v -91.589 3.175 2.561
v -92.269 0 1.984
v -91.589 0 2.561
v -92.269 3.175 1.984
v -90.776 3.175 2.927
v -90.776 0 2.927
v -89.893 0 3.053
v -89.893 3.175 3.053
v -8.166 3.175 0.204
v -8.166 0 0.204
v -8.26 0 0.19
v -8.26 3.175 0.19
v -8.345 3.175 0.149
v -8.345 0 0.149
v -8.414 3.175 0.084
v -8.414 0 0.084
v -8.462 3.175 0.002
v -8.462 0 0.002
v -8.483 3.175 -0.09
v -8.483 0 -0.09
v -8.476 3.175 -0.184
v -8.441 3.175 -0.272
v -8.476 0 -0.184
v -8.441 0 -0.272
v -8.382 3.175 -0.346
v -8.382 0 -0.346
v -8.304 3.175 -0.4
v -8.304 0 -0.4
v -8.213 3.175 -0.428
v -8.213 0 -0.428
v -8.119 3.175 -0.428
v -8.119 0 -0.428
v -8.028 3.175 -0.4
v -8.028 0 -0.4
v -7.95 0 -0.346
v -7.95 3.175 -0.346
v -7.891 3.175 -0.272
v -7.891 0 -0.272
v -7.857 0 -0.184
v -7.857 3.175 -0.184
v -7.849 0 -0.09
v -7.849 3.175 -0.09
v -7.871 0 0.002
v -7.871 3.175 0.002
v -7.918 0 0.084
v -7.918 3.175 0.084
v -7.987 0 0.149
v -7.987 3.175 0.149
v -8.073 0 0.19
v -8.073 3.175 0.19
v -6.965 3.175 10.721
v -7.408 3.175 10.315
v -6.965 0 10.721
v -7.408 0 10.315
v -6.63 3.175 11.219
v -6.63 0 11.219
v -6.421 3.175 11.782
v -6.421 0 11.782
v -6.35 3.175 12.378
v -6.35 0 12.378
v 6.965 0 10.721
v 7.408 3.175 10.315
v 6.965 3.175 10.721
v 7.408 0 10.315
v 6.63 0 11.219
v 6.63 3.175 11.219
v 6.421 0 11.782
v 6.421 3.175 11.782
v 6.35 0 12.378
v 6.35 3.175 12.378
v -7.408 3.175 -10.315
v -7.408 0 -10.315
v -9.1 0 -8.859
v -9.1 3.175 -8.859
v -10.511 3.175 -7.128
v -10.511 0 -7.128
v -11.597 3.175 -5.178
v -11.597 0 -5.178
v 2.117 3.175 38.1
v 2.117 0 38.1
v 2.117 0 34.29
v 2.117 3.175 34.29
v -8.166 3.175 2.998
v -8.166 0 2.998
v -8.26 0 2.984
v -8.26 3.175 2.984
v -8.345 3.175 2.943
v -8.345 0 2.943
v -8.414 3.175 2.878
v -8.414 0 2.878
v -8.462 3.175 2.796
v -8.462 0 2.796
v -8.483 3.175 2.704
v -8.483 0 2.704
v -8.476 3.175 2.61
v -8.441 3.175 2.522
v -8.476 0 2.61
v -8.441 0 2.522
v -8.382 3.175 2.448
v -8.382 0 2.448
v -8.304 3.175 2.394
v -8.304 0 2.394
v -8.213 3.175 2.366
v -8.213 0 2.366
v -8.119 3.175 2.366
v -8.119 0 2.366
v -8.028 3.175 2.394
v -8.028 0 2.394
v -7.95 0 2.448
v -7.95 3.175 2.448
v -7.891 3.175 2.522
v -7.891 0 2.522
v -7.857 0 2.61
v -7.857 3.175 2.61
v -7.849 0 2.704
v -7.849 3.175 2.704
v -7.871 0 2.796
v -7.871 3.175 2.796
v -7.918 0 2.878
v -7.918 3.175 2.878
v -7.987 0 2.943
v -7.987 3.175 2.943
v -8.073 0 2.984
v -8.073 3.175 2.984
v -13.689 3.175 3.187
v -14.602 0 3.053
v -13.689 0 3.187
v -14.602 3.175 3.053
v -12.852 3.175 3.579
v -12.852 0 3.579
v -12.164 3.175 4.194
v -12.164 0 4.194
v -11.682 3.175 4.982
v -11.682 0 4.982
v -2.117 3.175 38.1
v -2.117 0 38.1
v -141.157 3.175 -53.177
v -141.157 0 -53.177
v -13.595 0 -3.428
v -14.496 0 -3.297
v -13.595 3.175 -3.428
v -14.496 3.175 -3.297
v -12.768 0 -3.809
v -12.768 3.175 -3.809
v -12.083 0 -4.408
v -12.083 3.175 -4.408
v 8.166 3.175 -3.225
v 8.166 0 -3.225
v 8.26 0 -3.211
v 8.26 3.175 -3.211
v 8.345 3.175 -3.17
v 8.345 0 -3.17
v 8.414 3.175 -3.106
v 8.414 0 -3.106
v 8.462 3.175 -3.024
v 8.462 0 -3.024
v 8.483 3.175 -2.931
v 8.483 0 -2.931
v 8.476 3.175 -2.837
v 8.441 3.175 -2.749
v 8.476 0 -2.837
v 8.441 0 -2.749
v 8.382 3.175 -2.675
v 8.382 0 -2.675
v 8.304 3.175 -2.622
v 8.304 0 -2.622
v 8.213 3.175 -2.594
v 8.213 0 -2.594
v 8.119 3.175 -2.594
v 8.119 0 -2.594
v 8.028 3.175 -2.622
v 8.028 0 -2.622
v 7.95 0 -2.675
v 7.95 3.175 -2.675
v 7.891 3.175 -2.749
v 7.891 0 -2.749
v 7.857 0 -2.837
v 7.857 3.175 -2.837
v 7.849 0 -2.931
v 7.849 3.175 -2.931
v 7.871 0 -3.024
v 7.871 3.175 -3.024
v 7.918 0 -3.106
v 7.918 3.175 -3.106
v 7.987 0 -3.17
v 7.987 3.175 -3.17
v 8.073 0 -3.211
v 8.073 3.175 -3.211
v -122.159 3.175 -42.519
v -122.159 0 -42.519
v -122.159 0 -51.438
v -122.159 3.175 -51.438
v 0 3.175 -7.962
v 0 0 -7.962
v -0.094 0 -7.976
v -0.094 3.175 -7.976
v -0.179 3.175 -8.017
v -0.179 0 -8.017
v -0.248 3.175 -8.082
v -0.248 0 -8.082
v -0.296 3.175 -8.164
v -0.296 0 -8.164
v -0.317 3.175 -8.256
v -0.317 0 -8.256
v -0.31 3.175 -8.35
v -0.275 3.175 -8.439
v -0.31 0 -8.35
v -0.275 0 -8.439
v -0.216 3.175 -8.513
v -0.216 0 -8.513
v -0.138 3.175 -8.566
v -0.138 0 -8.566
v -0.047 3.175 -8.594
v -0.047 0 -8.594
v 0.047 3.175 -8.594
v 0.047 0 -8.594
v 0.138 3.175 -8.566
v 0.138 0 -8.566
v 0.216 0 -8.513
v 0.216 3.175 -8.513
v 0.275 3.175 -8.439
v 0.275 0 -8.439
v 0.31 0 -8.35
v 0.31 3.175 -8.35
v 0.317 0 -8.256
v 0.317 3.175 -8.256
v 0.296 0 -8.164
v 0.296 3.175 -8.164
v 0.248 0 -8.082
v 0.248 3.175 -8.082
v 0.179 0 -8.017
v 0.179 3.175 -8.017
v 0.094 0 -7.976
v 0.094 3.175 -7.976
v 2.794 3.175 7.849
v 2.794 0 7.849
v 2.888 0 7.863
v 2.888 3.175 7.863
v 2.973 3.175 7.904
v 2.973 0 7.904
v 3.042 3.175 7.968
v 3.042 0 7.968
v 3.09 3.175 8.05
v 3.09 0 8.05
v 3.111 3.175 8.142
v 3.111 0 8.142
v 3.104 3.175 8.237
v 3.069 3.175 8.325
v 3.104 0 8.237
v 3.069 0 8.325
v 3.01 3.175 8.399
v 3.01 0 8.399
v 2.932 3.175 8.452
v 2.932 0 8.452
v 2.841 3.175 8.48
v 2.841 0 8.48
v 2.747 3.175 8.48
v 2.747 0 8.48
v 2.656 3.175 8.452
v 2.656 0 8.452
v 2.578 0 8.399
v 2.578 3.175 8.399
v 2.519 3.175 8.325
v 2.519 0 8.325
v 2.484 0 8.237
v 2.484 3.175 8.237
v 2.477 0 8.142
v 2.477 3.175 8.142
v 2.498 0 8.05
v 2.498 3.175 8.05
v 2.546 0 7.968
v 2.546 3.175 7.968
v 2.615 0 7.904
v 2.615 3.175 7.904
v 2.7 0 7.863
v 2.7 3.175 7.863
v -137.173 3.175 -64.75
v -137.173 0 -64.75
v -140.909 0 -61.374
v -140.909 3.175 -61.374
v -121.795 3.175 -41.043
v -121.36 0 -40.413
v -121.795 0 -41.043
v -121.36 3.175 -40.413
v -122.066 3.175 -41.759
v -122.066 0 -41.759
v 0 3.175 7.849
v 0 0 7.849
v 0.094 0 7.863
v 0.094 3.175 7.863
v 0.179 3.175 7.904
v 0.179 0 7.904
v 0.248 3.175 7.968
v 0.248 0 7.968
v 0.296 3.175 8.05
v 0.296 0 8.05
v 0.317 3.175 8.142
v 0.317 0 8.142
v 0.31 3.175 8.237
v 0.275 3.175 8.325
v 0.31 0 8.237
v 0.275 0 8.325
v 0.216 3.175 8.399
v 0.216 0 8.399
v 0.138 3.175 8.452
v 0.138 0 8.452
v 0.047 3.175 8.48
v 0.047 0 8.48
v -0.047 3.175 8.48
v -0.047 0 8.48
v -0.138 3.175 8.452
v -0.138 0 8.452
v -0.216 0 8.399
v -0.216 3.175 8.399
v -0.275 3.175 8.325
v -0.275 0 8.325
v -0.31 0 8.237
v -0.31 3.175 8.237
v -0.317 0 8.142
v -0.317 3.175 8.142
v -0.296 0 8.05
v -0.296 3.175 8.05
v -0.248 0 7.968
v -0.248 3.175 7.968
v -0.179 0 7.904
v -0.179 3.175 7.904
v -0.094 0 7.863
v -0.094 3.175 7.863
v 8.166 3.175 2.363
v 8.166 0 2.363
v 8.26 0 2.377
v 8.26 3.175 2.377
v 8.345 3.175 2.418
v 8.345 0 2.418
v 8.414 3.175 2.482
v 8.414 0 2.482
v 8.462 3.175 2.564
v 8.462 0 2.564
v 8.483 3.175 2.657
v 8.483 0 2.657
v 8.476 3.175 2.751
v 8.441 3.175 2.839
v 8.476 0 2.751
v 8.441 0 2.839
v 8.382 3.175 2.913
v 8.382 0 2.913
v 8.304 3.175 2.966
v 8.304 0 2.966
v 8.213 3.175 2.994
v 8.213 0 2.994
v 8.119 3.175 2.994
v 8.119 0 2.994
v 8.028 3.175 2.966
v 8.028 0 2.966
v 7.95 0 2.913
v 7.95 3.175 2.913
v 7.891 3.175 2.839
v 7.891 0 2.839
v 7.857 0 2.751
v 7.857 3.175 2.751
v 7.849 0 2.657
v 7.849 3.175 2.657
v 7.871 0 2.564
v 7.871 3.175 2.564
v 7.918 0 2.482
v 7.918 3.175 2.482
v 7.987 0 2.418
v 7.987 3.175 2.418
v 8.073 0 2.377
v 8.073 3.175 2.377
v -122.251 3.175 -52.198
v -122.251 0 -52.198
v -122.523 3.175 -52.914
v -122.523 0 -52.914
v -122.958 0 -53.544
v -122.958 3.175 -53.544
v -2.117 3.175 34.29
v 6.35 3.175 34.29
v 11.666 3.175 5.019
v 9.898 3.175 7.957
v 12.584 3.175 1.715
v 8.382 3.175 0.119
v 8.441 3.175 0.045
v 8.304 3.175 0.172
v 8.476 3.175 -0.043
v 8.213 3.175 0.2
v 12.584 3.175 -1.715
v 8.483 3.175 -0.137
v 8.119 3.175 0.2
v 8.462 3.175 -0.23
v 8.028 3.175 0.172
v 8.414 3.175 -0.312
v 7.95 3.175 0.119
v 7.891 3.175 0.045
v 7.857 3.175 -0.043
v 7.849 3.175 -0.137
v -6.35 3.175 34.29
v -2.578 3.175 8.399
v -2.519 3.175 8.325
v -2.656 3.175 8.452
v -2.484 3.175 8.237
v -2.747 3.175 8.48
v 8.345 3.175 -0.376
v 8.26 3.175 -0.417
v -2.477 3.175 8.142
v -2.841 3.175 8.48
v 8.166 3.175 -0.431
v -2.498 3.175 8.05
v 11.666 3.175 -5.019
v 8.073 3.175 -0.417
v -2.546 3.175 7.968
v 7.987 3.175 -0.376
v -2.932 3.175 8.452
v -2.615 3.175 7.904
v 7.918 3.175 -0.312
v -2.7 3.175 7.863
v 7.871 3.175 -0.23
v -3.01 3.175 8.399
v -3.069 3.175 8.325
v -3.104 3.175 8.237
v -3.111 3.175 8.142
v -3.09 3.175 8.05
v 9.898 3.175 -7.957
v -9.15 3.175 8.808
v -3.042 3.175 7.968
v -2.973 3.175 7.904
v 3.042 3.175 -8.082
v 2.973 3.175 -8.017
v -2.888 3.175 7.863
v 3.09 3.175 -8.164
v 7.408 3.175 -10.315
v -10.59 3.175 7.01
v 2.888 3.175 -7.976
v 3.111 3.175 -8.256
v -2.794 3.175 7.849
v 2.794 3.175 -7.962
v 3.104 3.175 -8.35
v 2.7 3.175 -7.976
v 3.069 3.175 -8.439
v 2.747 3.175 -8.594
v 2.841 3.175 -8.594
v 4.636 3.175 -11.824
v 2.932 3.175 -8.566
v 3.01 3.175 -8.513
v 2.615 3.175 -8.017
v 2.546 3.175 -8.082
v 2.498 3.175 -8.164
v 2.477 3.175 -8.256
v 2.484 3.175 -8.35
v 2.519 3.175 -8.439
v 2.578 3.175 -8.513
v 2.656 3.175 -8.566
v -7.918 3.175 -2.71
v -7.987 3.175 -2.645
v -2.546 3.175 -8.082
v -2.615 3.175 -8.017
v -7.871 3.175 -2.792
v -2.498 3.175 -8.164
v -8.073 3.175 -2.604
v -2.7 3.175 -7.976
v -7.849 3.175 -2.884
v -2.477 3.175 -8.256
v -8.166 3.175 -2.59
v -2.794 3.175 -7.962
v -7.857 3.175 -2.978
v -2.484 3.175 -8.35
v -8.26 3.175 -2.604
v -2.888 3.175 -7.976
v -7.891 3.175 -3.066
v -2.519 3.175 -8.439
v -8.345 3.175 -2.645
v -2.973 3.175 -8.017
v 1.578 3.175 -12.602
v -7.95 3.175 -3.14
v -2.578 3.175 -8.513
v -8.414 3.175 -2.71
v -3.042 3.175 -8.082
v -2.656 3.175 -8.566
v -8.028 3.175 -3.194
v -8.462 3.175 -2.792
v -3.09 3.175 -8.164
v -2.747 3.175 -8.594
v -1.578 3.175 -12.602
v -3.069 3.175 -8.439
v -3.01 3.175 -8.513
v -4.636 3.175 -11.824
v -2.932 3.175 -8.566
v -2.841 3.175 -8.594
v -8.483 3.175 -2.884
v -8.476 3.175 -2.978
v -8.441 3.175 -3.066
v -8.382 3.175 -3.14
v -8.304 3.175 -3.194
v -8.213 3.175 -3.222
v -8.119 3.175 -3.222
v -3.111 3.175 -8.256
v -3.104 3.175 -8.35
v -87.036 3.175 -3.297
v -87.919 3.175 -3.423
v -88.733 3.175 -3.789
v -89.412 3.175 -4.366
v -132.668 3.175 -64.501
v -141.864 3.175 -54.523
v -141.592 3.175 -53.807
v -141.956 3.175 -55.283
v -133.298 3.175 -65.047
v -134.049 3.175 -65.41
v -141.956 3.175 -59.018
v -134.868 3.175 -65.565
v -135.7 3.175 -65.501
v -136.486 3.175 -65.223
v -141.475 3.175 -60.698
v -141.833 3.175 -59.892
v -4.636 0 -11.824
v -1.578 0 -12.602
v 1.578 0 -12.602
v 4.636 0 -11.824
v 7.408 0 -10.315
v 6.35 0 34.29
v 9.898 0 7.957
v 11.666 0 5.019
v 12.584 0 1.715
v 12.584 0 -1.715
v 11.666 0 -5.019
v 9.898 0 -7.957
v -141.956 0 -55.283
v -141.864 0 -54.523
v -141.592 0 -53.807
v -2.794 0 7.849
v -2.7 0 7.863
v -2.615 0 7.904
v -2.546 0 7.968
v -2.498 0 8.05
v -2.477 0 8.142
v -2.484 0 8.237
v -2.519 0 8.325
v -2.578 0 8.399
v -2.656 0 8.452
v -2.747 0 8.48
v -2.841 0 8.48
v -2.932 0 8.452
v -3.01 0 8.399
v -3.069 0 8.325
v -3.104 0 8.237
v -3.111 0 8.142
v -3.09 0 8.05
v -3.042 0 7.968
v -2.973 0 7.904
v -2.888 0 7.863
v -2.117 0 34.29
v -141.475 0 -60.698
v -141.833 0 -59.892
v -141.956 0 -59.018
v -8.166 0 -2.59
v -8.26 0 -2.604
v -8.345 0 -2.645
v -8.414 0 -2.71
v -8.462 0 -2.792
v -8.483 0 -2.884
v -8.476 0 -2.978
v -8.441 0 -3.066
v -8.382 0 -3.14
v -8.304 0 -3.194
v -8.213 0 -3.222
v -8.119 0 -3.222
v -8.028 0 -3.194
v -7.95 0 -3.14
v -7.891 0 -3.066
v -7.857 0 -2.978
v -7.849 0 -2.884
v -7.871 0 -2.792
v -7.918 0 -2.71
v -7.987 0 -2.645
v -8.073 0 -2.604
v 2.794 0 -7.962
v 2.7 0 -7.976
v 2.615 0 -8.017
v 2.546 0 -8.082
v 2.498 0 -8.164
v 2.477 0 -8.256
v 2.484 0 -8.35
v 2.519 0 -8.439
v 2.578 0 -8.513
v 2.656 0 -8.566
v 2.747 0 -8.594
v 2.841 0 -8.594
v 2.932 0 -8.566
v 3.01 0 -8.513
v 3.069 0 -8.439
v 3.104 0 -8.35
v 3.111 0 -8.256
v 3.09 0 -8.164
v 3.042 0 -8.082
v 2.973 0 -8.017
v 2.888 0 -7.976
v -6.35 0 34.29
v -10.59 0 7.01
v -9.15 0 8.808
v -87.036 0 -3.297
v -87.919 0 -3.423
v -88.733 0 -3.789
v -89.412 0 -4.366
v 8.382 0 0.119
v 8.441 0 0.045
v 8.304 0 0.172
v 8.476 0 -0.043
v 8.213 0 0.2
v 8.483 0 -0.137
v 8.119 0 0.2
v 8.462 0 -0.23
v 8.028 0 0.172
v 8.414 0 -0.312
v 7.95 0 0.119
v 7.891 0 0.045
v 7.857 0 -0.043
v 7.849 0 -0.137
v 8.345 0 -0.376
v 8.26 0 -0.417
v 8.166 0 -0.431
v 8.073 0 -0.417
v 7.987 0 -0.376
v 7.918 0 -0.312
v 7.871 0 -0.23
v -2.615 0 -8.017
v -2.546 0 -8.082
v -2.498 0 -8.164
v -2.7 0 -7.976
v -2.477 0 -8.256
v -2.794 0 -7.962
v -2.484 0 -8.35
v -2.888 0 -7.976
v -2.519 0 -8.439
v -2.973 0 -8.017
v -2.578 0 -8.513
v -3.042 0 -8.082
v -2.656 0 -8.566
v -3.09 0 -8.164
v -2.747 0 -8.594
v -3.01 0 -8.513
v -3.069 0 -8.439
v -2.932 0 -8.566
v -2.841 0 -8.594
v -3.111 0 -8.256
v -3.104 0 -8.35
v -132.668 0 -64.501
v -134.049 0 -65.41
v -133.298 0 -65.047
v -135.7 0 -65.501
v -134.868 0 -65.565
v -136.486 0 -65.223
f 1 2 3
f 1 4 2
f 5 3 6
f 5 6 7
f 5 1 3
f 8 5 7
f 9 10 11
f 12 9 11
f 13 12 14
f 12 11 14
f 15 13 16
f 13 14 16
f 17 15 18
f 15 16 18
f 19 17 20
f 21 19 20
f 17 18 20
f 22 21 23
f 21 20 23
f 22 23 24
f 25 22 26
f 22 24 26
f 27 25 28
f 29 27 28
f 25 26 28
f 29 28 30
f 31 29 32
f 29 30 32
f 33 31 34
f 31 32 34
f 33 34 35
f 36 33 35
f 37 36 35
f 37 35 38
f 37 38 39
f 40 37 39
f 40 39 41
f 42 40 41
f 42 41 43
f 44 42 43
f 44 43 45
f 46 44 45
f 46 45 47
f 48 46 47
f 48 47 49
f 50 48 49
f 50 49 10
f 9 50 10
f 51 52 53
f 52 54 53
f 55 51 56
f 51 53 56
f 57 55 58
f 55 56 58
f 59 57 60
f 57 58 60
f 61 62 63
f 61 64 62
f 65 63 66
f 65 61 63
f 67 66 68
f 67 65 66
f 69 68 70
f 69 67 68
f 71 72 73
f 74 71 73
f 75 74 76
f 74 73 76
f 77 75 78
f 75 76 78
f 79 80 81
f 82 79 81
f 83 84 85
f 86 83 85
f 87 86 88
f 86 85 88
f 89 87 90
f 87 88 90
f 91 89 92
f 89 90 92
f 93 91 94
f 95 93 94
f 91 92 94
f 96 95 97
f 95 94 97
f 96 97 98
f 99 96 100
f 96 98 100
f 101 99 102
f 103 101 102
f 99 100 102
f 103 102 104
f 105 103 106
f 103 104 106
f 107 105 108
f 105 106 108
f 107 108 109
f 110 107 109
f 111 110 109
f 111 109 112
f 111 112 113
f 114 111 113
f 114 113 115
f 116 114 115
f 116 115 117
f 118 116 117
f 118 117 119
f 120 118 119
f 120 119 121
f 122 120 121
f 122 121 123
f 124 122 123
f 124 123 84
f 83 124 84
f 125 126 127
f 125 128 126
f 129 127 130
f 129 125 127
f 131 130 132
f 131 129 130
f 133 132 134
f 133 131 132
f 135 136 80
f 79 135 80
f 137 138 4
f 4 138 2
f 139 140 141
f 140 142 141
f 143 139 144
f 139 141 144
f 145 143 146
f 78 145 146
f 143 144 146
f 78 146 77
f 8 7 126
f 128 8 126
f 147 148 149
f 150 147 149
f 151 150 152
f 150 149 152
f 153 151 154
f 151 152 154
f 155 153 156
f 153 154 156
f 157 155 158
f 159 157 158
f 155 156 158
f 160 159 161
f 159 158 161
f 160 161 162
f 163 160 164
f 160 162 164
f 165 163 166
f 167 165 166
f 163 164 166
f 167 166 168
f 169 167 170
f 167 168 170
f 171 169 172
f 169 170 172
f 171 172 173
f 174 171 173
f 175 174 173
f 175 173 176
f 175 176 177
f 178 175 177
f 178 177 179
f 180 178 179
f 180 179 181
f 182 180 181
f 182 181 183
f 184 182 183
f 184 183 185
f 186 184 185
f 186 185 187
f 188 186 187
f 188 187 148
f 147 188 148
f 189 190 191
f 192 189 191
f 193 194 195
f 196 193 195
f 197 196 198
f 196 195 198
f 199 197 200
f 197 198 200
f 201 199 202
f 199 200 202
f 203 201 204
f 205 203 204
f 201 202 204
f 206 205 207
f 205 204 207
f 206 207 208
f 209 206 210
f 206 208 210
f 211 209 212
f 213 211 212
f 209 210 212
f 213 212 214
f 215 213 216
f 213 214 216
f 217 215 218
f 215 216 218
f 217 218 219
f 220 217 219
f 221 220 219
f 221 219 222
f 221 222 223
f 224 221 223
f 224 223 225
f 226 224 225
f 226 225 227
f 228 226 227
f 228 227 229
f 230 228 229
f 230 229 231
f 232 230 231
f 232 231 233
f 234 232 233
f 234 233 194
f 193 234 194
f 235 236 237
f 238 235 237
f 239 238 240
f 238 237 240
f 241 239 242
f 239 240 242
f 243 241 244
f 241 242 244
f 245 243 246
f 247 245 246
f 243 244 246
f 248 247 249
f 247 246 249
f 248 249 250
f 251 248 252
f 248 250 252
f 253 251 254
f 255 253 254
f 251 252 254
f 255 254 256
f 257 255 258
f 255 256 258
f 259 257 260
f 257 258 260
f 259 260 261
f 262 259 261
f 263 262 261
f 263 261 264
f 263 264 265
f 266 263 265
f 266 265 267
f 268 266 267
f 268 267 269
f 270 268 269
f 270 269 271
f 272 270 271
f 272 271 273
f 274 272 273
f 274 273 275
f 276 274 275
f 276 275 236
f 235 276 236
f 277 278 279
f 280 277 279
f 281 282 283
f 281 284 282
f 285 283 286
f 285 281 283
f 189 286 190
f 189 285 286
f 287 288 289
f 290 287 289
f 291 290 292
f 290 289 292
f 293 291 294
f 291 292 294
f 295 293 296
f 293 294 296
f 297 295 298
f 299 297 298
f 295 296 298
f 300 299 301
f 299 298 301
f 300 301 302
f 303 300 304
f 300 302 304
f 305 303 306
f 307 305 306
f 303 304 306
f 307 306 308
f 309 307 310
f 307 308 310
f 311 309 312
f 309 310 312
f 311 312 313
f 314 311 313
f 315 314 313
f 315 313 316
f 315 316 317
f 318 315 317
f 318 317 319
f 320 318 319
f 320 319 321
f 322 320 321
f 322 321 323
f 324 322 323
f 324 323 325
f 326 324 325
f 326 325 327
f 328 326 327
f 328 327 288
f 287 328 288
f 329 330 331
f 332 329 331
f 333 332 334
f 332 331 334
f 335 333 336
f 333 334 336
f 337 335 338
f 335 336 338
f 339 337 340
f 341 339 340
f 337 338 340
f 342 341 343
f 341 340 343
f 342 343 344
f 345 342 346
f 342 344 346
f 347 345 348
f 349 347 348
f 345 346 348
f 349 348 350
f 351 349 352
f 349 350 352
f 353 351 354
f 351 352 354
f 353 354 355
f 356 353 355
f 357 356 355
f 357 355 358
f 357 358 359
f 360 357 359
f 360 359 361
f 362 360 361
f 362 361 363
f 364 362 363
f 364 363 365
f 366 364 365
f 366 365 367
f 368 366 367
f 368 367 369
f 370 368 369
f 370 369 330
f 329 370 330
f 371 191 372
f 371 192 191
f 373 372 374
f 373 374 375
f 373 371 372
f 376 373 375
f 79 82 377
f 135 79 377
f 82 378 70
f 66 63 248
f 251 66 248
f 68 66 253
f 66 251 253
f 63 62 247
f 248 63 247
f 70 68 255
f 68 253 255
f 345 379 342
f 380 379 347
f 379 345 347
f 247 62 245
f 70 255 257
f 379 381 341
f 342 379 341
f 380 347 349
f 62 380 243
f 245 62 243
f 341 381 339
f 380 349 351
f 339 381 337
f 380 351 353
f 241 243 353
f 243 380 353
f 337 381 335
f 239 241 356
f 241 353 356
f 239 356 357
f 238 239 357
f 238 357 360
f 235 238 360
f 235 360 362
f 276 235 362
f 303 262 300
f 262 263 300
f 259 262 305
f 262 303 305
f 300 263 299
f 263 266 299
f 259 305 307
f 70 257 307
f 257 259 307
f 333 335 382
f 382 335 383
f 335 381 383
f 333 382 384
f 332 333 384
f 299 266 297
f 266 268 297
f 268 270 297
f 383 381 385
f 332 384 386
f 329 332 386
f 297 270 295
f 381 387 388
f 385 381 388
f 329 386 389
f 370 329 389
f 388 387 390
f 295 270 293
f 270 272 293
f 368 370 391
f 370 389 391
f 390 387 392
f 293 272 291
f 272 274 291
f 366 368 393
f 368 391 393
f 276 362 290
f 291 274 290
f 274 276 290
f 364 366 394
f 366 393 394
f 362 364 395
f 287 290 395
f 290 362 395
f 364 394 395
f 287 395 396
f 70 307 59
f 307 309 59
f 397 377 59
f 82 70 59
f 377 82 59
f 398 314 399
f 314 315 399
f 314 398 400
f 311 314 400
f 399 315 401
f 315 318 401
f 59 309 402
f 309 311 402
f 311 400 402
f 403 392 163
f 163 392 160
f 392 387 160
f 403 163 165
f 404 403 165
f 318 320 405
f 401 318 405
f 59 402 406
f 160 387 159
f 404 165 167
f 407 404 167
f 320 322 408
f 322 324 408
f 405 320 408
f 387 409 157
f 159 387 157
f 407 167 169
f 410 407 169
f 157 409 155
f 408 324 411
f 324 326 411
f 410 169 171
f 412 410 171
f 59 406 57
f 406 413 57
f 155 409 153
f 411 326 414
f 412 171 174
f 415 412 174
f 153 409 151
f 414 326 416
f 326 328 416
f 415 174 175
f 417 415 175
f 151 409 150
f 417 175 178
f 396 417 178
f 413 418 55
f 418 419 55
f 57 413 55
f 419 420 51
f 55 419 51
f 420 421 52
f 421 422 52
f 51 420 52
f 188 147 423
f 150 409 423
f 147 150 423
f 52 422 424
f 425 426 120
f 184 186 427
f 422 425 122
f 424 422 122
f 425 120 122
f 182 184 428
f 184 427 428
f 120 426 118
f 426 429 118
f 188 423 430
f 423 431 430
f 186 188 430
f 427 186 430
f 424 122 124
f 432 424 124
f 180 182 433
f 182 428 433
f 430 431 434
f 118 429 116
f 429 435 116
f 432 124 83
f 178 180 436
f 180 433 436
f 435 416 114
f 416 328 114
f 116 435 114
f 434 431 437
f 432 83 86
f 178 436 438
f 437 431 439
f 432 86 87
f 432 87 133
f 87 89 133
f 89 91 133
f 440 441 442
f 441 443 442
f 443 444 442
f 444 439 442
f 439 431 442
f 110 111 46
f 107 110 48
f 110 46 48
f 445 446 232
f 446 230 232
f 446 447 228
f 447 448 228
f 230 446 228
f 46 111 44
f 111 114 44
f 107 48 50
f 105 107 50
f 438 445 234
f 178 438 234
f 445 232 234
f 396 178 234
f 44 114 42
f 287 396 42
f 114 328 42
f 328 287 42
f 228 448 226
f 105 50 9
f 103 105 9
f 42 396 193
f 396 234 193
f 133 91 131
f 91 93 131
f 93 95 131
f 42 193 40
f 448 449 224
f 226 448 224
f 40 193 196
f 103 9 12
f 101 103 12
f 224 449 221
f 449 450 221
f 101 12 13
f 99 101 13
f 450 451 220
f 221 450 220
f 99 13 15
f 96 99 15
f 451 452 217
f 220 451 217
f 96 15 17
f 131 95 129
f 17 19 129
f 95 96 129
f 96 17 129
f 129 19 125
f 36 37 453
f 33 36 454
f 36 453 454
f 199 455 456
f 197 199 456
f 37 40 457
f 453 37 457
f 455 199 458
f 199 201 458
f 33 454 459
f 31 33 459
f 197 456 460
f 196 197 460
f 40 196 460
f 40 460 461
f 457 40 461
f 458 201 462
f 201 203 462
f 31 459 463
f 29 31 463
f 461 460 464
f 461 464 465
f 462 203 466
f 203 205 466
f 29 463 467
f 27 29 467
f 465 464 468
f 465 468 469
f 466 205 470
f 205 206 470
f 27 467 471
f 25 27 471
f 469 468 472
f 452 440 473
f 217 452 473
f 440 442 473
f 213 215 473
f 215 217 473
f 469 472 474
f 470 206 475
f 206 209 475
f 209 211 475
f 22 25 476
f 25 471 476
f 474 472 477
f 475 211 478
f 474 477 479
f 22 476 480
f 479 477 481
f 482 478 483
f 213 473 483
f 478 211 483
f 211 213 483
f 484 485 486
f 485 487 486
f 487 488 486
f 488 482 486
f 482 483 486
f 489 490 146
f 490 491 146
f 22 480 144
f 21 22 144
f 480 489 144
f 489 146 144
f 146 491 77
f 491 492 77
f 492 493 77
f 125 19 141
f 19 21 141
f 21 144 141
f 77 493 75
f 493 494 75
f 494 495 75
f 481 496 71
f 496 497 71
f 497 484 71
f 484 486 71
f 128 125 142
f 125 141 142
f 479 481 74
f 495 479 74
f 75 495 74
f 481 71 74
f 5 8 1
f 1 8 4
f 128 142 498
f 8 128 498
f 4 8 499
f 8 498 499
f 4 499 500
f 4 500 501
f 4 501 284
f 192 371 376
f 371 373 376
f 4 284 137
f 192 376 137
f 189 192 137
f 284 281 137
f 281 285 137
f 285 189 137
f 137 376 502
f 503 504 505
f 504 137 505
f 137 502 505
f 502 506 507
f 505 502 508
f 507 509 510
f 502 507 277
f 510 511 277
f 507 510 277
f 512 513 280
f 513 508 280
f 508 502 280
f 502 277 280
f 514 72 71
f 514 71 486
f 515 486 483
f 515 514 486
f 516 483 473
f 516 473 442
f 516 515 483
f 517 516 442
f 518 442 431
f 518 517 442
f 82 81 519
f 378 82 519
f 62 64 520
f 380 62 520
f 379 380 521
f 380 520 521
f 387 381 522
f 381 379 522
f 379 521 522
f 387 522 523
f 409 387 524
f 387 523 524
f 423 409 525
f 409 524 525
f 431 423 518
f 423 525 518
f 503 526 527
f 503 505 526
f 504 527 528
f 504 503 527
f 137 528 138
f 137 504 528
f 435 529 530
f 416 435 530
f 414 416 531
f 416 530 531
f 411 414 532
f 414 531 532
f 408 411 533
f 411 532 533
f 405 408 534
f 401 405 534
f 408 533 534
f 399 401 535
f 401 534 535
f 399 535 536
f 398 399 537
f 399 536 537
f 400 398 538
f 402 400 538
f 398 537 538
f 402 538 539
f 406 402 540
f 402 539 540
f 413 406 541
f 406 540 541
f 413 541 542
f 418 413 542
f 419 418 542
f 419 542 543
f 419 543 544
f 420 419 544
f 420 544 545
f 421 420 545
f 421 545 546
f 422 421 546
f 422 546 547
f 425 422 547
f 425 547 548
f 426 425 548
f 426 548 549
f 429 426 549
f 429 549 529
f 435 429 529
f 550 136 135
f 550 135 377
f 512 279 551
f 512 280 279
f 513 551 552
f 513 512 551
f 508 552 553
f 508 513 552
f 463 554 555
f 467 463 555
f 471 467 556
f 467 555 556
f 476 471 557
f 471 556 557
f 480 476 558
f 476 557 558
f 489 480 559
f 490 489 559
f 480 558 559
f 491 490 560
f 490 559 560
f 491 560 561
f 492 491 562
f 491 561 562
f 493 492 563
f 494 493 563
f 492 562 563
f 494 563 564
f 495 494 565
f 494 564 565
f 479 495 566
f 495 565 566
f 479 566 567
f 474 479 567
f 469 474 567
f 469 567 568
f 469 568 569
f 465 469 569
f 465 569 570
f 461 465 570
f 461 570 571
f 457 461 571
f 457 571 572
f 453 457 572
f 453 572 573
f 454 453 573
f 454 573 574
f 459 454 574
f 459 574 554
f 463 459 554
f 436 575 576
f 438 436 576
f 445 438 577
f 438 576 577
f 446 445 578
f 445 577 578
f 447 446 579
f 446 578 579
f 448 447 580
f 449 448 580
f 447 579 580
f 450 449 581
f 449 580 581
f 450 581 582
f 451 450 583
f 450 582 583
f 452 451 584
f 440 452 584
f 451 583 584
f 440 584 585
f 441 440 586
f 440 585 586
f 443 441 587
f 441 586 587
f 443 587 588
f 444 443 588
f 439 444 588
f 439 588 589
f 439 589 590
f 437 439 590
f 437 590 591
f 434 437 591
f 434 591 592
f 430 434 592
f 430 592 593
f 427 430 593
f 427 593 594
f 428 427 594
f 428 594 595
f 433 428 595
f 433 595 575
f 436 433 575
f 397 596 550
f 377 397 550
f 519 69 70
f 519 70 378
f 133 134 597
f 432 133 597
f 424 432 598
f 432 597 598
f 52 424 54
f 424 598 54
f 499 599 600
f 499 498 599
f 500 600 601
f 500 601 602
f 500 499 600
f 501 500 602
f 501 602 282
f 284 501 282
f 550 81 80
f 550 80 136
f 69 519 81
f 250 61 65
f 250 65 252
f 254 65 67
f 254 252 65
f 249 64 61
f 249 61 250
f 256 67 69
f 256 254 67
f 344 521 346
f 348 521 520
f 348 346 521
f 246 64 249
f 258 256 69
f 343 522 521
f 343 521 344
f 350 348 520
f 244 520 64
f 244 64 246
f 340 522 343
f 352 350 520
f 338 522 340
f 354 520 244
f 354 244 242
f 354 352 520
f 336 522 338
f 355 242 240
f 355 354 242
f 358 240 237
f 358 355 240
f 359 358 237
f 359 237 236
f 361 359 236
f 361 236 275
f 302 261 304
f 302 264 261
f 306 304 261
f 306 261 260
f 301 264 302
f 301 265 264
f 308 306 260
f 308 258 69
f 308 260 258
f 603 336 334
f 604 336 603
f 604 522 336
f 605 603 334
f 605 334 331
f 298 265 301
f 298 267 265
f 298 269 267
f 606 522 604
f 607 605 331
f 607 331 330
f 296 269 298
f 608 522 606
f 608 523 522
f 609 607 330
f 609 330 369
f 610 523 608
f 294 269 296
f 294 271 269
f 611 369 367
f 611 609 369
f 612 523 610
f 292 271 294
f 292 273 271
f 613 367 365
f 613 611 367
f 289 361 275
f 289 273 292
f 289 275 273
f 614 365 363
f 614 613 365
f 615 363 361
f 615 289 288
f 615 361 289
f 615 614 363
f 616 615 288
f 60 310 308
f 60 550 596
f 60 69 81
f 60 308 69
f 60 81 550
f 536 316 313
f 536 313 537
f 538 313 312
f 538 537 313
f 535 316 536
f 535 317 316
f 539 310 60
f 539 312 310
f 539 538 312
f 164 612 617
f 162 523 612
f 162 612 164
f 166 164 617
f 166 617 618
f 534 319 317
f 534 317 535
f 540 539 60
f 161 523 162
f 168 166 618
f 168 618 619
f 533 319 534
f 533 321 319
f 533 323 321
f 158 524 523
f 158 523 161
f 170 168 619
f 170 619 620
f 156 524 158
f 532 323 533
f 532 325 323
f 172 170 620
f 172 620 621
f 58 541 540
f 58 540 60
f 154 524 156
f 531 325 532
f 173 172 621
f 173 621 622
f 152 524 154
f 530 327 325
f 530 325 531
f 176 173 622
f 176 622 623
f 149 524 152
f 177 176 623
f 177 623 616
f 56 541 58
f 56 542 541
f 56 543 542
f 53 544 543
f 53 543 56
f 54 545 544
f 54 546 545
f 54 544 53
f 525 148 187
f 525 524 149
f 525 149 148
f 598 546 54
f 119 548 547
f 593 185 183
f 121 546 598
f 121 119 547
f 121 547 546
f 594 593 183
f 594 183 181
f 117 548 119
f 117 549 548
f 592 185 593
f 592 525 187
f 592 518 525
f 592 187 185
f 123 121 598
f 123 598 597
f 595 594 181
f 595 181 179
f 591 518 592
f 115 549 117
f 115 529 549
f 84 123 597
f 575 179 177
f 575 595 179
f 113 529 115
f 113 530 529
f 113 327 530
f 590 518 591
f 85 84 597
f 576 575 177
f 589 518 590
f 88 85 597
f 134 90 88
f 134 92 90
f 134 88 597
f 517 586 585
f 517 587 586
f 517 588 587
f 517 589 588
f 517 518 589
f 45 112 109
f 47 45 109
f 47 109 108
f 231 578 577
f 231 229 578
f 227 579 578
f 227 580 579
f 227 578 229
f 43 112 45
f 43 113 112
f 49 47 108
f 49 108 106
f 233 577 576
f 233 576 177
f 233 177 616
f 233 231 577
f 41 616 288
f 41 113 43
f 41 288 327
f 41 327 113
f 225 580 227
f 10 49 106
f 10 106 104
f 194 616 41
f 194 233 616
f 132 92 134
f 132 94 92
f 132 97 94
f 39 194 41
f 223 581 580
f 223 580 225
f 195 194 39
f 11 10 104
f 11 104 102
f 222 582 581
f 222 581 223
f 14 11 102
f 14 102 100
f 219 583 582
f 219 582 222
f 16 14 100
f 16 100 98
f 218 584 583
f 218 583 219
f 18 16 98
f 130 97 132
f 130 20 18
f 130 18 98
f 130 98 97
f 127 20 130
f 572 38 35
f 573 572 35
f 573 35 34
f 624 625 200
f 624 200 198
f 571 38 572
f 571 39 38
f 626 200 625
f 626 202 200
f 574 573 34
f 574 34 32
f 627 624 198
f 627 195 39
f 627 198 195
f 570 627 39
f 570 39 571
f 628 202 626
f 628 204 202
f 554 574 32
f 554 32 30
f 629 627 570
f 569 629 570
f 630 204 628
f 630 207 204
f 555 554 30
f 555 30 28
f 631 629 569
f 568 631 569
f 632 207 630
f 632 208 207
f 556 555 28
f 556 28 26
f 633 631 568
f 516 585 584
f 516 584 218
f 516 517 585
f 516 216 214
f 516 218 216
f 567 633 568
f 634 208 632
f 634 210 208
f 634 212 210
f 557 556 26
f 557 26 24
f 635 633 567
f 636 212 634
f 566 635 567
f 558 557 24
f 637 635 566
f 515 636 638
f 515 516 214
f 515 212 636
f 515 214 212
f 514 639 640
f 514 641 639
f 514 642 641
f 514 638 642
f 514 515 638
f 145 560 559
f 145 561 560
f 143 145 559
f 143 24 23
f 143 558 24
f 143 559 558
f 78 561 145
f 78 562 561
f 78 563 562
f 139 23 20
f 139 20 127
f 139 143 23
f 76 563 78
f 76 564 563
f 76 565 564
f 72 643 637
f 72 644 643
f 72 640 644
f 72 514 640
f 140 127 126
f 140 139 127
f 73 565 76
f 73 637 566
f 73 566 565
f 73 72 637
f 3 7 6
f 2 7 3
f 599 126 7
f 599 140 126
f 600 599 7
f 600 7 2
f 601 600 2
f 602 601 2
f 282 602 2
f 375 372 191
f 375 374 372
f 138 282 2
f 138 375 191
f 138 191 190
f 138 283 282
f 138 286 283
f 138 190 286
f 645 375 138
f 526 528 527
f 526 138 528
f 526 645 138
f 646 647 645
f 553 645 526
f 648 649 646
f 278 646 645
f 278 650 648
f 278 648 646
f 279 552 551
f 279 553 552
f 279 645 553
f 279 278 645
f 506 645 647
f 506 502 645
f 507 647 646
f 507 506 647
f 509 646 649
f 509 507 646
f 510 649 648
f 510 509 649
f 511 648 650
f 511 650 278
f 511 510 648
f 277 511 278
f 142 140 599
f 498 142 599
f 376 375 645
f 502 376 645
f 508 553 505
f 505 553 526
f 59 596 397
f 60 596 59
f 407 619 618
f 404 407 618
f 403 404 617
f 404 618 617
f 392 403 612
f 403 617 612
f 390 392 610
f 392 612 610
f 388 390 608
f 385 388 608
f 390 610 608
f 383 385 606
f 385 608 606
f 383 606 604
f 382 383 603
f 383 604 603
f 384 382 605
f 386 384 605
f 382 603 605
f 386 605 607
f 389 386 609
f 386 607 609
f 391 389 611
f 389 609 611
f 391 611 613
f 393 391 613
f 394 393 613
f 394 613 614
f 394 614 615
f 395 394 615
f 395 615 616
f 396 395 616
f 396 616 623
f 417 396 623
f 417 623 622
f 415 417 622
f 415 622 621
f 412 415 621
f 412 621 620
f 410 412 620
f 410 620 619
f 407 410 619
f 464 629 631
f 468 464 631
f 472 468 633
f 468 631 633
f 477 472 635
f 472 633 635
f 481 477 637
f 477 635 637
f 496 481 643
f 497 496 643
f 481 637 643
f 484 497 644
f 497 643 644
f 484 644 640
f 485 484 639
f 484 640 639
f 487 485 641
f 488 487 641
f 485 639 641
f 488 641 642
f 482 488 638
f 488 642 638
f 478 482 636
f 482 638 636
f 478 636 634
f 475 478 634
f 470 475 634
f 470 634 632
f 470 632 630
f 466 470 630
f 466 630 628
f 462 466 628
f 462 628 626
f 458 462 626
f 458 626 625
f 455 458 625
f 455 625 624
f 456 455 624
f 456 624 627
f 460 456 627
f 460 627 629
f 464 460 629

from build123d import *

# Parameters (mm, degrees)
STOCK_RECORD_NEEDLE_1_DEPTH     = 3.175
FILLET1_R                       = 3.175
X_Z_TURN_SKETCH_W               = 4.233333334
X_Z_TURN_SKETCH_H               = 3.81
X_Y_TURN_DEPTH                  = 3.175
FILLET2_R                       = 2.54
RIGHT_START                     = -3.175
RIGHT_SIDE_DELETE_DEPTH         = 3.175
SERVO_HORN_MOUNT_HOLES_SKETCH_R = 0.3175
SERVO_HORN_MOUNT_HOLES_DEPTH    = 157.399949281


# Read off the part's stored shape, not the designer's step: Stock-Record Needle-1
with BuildPart() as part:
    # Stock-Record Needle-1 outline → Stock-Record Needle-1 (new body)
    with BuildSketch(Plane(origin=(0, 0, 0), x_dir=(1, 0, 0), z_dir=(0, 1, 0))):
        with BuildLine():
            Line((-12.264516886, 3.297214818), (-88.464516886, 3.297214818))
            Line((-88.464516886, 3.297214818), (-122.158808708, 41.314772585))
            Line((-122.158808708, 41.314772585), (-122.158808708, 52.642883574))
            Line((-122.158808708, 52.642883574), (-134.794168142, 66.899467737))
            Line((-134.794168142, 66.899467737), (-141.955930631, 60.428744281))
            Line((-141.955930631, 60.428744281), (-141.955930631, 54.078744281))
            Line((-141.955930631, 54.078744281), (-91.321262361, -3.052785182))
            Line((-91.321262361, -3.052785182), (-12.327631672, -3.052785182))
            ThreePointArc((-12.327631672, -3.052785182), (12.699372727, -0.126223338), (-12.264516886, 3.297214818))
        make_face()
    extrude(amount=STOCK_RECORD_NEEDLE_1_DEPTH)

    # Fillet1
    fillet1_edges = [part.edges().sort_by_distance(p)[0] for p in [
        (-122.158808708, 1.5875, -52.642883574),
        (-134.794168142, 1.5875, -66.899467737),
        (-141.955930631, 1.5875, -60.428744281),
        (-141.955930631, 1.5875, -54.078744281),
        (-12.327631672, 1.5875, 3.052785182),
        (-12.264516886, 1.5875, -3.297214818),
        (-88.464516886, 1.5875, -3.297214818),
        (-122.158808708, 1.5875, -41.314772585),
        (-91.321262361, 1.5875, 3.052785182),
    ]]
    fillet(fillet1_edges, radius=FILLET1_R)

    # X-Z Turn Sketch' → X-Y Turn (add)
    with BuildSketch(Plane(origin=(0, 0, 0), x_dir=(1, 0, 0), z_dir=(0, 1, 0))):
        Polygon((-6.35, 34.29), (-2.116666667, 34.29), (-2.116666667, 38.1), (2.116666667, 38.1), (2.116666667, 34.29), (6.35, 34.29), (6.35, -34.29), (2.116666667, -34.29), (-2.116666667, -34.29), (-6.35, -34.29), align=None)
        with Locations((0, -36.195)):
            Rectangle(X_Z_TURN_SKETCH_W, X_Z_TURN_SKETCH_H)
    extrude(amount=X_Y_TURN_DEPTH)

    # Fillet2
    fillet2_edges = [part.edges().sort_by_distance(p)[0] for p in [
        (6.35, 1.5875, -10.998522627),
        (6.35, 1.5875, 10.998522628),
        (-6.35, 1.5875, -10.998522628),
        (-6.35, 1.5875, 10.998522629),
    ]]
    fillet(fillet2_edges, radius=FILLET2_R)

    # Sketch2 → Right Side Delete (cut)
    with BuildSketch(Plane(origin=(0, 3.175, 0), x_dir=(1, 0, 0), z_dir=(0, 1, 0)).offset(RIGHT_START)):
        with BuildLine():
            Line((11.695597813, 4.950049677), (11.695597813, 35.504326251))
            Line((11.695597813, 35.504326251), (11.695597813, 40.086272904))
            Line((11.695597813, 40.086272904), (-12.040083059, 40.086272904))
            Line((-12.040083059, 40.086272904), (-9.843545264, 8.024625639))
            ThreePointArc((-9.843545264, 8.024625639), (1.79465289, 12.572558252), (11.695597813, 4.950049677))
        make_face()
    extrude(amount=RIGHT_SIDE_DELETE_DEPTH, mode=Mode.SUBTRACT)

    # Servo Horn Mount Holes Sketch → Servo Horn Mount Holes (cut, through all)
    with BuildSketch(Plane.XZ):
        with Locations(Location((0, 8.1661, 0), (0, 0, 270))):
            Circle(SERVO_HORN_MOUNT_HOLES_SKETCH_R)
        with Locations(Location((2.794, 8.1661, 0), (0, 0, 270))):
            Circle(SERVO_HORN_MOUNT_HOLES_SKETCH_R)
        with Locations(Location((-2.794, 8.1661, 0), (0, 0, 270))):
            Circle(SERVO_HORN_MOUNT_HOLES_SKETCH_R)
        with Locations(Location((2.794, -8.279792428, 0), (0, 0, 90))):
            Circle(SERVO_HORN_MOUNT_HOLES_SKETCH_R)
        with Locations(Location((0, -8.279792428, 0), (0, 0, 90))):
            Circle(SERVO_HORN_MOUNT_HOLES_SKETCH_R)
        with Locations(Location((-2.794, -8.279792428, 0), (0, 0, 90))):
            Circle(SERVO_HORN_MOUNT_HOLES_SKETCH_R)
        with Locations(Location((8.1661, -0.113692428, 0), (0, 0, 270))):
            Circle(SERVO_HORN_MOUNT_HOLES_SKETCH_R)
        with Locations(Location((8.1661, 2.680307572, 0), (0, 0, 270))):
            Circle(SERVO_HORN_MOUNT_HOLES_SKETCH_R)
        with Locations(Location((8.1661, -2.907692428, 0), (0, 0, 270))):
            Circle(SERVO_HORN_MOUNT_HOLES_SKETCH_R)
        with Locations(Location((-8.1661, -2.907692428, 0), (0, 0, 90))):
            Circle(SERVO_HORN_MOUNT_HOLES_SKETCH_R)
        with Locations(Location((-8.1661, 2.680307572, 0), (0, 0, 90))):
            Circle(SERVO_HORN_MOUNT_HOLES_SKETCH_R)
        with Locations(Location((-8.1661, -0.113692428, 0), (0, 0, 90))):
            Circle(SERVO_HORN_MOUNT_HOLES_SKETCH_R)
    extrude(amount=-SERVO_HORN_MOUNT_HOLES_DEPTH, mode=Mode.SUBTRACT)


solid = part.part
